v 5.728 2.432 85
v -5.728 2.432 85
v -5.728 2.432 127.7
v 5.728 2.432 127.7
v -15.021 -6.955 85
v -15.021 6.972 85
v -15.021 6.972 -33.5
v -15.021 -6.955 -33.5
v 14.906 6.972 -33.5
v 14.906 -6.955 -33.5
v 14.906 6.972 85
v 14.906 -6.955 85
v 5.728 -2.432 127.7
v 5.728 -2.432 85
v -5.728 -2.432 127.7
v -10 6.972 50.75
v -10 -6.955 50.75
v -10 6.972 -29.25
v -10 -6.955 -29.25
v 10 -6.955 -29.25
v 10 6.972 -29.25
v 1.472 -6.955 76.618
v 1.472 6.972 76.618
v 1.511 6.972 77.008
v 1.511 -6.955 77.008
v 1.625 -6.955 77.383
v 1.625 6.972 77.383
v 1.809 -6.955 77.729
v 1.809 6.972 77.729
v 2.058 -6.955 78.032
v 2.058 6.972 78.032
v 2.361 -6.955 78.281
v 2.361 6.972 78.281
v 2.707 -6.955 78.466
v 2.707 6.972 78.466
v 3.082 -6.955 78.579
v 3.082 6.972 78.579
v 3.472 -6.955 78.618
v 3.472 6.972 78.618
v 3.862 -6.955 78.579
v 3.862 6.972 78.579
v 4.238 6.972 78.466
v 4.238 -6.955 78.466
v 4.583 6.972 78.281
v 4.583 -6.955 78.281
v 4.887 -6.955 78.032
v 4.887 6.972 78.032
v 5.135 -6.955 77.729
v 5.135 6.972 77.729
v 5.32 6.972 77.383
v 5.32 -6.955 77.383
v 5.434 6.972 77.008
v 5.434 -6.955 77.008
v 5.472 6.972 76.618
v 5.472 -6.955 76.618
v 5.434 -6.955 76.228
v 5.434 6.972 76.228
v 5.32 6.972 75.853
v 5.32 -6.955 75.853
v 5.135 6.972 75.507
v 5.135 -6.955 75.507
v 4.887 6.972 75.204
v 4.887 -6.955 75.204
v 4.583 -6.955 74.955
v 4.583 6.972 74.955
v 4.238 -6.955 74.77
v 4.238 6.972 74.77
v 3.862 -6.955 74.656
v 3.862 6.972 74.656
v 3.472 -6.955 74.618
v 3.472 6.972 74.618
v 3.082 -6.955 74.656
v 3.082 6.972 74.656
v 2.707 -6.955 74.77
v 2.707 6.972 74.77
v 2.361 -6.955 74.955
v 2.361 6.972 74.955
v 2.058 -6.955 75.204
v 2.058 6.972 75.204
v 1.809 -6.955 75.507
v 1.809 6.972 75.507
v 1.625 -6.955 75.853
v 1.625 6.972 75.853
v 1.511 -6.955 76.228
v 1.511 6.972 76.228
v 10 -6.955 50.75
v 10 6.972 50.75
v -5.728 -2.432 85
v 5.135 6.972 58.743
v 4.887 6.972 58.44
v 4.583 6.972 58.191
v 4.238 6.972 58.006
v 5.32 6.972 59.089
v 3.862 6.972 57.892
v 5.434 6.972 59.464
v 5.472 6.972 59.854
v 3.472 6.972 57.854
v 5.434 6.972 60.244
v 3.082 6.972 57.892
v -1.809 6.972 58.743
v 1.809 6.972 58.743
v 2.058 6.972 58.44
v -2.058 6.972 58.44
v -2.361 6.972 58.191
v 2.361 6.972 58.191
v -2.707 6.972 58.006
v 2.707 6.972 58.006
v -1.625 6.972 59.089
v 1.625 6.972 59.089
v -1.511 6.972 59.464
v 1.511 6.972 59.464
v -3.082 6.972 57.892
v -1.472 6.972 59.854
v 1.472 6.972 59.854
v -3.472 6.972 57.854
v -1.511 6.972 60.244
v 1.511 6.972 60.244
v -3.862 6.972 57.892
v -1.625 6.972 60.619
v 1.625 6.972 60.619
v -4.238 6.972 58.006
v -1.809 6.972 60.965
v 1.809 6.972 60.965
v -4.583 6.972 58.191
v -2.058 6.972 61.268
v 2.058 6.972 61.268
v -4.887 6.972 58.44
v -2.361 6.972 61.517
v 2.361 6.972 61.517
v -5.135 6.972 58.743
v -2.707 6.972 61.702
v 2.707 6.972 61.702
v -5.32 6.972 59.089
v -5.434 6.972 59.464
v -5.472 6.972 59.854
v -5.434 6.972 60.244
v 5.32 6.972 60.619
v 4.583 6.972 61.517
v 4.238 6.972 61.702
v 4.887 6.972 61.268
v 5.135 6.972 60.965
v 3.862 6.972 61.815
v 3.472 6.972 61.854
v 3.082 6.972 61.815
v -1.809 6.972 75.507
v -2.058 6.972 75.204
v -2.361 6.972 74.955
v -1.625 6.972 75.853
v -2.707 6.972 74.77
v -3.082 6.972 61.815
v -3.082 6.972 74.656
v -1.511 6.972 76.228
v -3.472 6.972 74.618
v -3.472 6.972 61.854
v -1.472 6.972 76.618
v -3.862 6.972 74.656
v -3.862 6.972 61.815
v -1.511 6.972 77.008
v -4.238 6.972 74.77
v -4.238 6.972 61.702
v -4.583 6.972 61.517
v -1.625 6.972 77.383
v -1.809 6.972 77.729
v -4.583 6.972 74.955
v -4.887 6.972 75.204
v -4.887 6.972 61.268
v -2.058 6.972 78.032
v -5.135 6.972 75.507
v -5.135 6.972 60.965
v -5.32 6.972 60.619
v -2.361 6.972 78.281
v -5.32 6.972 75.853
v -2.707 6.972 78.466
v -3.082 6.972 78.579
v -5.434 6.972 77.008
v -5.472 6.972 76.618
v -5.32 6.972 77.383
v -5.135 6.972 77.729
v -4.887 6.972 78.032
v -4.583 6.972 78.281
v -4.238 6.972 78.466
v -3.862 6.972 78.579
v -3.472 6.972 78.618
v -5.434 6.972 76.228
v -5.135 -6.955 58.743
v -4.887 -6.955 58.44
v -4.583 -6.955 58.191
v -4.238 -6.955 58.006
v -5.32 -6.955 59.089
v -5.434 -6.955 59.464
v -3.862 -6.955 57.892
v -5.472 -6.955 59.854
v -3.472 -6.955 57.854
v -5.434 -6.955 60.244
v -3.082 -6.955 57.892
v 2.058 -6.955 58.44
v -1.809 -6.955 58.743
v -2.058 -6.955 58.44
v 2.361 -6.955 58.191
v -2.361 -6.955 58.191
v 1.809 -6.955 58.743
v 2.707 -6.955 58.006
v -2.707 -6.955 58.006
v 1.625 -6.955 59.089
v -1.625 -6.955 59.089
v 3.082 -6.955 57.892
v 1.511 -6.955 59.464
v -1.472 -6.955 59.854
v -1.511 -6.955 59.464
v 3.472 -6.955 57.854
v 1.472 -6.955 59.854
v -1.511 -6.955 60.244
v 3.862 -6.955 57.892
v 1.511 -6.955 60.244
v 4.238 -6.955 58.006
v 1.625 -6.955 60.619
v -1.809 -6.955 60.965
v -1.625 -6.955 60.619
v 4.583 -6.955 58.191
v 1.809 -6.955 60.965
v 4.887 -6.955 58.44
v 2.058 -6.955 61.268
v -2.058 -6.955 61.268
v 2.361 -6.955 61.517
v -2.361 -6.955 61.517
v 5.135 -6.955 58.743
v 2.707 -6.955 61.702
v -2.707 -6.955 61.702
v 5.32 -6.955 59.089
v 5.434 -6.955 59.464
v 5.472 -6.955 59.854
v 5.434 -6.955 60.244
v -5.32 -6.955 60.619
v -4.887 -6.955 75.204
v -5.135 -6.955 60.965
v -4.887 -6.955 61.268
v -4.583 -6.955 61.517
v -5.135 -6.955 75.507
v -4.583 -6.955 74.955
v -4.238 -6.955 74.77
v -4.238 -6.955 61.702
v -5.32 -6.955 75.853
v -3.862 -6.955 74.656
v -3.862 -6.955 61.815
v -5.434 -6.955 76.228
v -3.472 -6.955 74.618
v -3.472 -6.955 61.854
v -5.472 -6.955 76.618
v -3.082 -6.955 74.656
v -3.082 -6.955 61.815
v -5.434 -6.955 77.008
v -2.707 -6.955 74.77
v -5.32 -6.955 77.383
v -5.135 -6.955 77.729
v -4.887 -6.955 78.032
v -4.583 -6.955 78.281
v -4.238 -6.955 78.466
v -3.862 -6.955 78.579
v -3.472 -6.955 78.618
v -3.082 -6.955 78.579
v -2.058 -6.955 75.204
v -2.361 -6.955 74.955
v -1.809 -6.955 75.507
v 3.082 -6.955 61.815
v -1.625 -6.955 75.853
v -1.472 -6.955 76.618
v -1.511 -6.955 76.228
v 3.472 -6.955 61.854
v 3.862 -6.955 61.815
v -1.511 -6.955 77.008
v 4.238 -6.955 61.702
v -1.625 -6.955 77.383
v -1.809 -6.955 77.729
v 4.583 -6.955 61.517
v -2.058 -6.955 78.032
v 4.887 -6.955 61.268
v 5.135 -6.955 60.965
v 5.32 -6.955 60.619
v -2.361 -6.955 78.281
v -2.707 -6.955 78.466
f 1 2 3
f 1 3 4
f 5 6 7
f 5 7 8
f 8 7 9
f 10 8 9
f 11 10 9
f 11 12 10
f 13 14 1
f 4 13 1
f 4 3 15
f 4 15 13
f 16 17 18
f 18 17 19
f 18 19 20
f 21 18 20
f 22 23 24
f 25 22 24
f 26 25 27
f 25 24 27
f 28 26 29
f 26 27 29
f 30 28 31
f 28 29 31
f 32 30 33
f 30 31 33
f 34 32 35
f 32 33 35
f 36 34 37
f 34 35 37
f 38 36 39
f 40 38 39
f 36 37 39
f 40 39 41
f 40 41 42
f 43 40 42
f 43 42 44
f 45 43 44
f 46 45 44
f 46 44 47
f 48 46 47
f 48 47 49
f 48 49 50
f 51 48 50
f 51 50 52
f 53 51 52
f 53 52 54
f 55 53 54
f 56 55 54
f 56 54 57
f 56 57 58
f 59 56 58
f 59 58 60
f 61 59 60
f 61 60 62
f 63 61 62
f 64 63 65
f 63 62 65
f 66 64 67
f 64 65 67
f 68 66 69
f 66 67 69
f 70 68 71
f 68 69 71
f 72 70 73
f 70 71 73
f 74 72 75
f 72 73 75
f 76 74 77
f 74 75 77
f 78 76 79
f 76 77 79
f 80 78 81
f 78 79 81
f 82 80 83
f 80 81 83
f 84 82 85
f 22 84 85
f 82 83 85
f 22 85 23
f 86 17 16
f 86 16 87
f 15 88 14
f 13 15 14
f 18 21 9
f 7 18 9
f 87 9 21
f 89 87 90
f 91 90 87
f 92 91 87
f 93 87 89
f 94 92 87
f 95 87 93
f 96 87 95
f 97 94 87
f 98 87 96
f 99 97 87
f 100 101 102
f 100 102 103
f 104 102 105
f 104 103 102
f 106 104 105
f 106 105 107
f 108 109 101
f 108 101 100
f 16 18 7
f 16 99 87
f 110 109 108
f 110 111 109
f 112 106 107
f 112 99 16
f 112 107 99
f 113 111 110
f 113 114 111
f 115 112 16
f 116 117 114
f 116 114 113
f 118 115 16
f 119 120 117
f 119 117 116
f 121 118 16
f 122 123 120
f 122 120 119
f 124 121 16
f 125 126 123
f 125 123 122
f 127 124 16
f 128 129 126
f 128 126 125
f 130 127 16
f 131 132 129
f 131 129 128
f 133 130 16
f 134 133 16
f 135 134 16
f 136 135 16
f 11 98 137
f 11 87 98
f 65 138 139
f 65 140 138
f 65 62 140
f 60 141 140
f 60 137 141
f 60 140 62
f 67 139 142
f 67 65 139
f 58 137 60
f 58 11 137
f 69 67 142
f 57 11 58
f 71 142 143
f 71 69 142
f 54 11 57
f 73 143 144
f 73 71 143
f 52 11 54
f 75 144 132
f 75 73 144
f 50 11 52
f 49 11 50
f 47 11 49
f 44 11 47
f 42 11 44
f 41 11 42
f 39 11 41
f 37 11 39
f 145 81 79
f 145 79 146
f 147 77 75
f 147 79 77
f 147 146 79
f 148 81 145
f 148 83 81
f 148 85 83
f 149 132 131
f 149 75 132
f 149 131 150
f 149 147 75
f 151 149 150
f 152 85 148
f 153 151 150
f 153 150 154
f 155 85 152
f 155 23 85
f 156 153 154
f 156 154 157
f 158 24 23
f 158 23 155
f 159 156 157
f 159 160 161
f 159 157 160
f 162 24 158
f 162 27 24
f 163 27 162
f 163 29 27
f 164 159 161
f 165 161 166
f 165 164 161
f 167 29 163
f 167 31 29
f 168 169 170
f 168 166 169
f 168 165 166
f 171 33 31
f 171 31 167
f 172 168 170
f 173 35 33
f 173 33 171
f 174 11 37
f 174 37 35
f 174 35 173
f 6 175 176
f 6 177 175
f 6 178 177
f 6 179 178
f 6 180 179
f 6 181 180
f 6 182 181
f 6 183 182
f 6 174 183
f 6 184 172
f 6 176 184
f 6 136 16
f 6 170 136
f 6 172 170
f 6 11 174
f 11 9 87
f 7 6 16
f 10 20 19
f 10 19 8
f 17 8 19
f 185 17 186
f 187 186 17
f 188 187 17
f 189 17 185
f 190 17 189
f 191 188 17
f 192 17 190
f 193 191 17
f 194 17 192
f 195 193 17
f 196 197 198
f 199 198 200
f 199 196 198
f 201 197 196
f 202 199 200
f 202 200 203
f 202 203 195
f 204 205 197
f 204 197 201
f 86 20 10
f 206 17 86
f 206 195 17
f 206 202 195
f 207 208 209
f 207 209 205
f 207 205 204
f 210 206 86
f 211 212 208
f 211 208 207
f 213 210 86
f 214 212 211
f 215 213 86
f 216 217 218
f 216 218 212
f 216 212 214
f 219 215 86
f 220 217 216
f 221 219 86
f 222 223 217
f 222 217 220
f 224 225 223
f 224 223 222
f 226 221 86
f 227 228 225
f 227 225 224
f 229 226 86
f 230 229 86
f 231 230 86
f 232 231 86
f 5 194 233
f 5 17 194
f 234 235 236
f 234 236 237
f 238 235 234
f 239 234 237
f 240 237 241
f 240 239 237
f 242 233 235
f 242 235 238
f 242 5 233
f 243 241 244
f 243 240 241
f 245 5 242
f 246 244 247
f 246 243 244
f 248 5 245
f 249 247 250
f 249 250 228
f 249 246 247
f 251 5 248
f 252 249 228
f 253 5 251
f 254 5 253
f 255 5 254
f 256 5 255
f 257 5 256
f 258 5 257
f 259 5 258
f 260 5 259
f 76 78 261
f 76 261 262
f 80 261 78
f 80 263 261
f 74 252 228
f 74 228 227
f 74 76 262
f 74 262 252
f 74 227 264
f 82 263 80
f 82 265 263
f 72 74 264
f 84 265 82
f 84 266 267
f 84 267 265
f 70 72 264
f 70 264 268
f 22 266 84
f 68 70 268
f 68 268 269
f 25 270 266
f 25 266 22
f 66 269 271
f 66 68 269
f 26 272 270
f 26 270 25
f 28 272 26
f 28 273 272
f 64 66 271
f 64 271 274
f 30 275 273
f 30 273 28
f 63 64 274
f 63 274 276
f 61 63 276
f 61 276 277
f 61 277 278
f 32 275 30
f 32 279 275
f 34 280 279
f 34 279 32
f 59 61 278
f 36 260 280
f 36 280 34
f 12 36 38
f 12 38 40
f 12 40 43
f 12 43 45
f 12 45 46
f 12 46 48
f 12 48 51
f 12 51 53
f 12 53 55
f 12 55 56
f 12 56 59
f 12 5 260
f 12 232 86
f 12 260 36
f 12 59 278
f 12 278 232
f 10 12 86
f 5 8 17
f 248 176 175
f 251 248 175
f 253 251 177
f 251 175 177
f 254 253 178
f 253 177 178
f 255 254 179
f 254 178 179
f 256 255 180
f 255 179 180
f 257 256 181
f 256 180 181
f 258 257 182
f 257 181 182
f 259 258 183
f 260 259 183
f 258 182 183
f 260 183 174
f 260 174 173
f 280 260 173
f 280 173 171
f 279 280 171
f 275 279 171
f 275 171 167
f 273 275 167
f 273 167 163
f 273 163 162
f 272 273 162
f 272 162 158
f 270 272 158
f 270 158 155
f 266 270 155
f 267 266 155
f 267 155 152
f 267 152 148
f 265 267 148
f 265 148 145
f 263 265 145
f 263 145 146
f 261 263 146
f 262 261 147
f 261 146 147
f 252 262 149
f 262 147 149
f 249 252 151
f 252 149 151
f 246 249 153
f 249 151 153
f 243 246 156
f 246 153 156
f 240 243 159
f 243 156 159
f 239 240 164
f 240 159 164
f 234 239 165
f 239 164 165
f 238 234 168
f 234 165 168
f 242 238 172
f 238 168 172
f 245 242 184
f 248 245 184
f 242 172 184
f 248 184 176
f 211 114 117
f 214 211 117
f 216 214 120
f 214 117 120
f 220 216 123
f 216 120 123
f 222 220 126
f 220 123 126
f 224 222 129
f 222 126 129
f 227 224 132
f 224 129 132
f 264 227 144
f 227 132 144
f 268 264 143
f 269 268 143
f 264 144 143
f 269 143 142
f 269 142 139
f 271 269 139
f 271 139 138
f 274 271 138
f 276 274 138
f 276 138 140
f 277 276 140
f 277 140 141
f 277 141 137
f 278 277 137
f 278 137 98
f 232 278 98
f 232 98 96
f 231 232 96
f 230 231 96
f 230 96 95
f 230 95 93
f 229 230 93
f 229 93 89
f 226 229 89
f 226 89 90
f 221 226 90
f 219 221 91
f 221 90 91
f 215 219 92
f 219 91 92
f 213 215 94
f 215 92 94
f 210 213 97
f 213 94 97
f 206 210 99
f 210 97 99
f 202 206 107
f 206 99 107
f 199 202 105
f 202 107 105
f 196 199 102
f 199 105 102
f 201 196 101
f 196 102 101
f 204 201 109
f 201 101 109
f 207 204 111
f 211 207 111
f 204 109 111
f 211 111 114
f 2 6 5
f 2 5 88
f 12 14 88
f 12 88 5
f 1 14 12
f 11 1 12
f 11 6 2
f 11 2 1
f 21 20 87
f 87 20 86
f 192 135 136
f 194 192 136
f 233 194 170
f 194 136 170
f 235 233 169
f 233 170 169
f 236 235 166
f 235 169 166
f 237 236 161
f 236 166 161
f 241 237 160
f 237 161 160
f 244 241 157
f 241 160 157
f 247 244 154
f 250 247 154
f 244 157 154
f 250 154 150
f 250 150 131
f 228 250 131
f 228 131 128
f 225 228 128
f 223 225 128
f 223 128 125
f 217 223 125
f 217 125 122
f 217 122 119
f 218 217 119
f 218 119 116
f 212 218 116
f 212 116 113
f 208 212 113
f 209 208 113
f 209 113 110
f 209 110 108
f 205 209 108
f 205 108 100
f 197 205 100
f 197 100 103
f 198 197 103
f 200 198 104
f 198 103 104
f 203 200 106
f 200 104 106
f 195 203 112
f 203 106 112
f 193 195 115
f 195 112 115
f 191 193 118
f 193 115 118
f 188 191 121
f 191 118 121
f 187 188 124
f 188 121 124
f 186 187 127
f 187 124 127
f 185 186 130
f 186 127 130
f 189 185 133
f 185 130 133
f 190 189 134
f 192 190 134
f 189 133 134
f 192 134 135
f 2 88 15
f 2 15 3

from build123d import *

# Parameters (mm, degrees)
F0_W     = 10.5505171232
F0_H     = 5.8358493261
F1_DEPTH = 85
F3_DEPTH = 33.5
F4_D     = 4
F5_W     = 11.4551503211
F5_H     = 4.8642051406
F6_DEPTH = 42.7
F7_W     = 20
F7_H     = 50
F7_H_2   = 30
F8_DEPTH = 25


with BuildPart() as f1:
    # F0 (on Top) → F1 (new body)
    with BuildSketch(Plane.XY):
        with BuildLine():
            ThreePointArc((6.3000439482, -6.9552523798), (8.5786924555, -3.8042246479), (9.3843534363, 0))
            ThreePointArc((9.3843534363, 0), (8.5736712413, 3.8155275996), (6.2816887803, 6.9718344419))
            Line((6.2816887803, 6.9718344419), (-6.2816887803, 6.9718344419))
            ThreePointArc((-6.2816887803, 6.9718344419), (-9.384345286, 0.0123680735), (-6.3000439482, -6.9552523798))
            Line((-6.3000439482, -6.9552523798), (6.3000439482, -6.9552523798))
        make_face()
        with Locations((0.2029326279, 0)):
            Rectangle(F0_W, F0_H, mode=Mode.SUBTRACT)
        with BuildLine():
            ThreePointArc((6.2816887803, 6.9718344419), (8.5736712413, 3.8155275996), (9.3843534363, 0))
            ThreePointArc((9.3843534363, 0), (8.5786924555, -3.8042246479), (6.3000439482, -6.9552523798))
            Line((6.3000439482, -6.9552523798), (14.9059631667, -6.9552523798))
            Line((14.9059631667, -6.9552523798), (14.9059631667, 6.9718344419))
            Line((14.9059631667, 6.9718344419), (6.2816887803, 6.9718344419))
        make_face()
        with Locations((0.2029326279, 0)):
            Rectangle(F0_W, F0_H)
        with BuildLine():
            ThreePointArc((-6.3000439482, -6.9552523798), (-9.384345286, 0.0123680735), (-6.2816887803, 6.9718344419))
            Line((-6.2816887803, 6.9718344419), (-15.021123655, 6.9718344419))
            Line((-15.021123655, 6.9718344419), (-15.021123655, -6.9552523798))
            Line((-15.021123655, -6.9552523798), (-6.3000439482, -6.9552523798))
        make_face()
    extrude(amount=F1_DEPTH)

    # F3 (add): a face of the model
    f3_faces = [f1.faces().sort_by_distance(p)[0] for p in [
        (-0.0575802442, 0.008291031, 0),
    ]]
    extrude(f3_faces, amount=F3_DEPTH)

    # F4 (through all)
    with Locations(Plane.XZ.offset(6.9552523798)):
        with Locations((3.4722961341, 76.6178924305), (-3.4723085311, 76.6178924305), (3.4722961341, 59.8538924305), (-3.4723085311, 59.8538924305)):
            Hole(F4_D / 2)

    # F5 (on face) → F6 (join)
    with BuildSketch(Plane.XY.offset(85)):
        Rectangle(F5_W, F5_H)
    extrude(amount=F6_DEPTH)

    # F7 (on face) → F8 (cut)
    with BuildSketch(Plane.XZ.offset(6.9552523798)):
        with Locations((0, 25.75)):
            Rectangle(F7_W, F7_H)
        with Locations((0, -14.25)):
            Rectangle(F7_W, F7_H_2)
    extrude(amount=-F8_DEPTH, mode=Mode.SUBTRACT)


solid = f1.part
